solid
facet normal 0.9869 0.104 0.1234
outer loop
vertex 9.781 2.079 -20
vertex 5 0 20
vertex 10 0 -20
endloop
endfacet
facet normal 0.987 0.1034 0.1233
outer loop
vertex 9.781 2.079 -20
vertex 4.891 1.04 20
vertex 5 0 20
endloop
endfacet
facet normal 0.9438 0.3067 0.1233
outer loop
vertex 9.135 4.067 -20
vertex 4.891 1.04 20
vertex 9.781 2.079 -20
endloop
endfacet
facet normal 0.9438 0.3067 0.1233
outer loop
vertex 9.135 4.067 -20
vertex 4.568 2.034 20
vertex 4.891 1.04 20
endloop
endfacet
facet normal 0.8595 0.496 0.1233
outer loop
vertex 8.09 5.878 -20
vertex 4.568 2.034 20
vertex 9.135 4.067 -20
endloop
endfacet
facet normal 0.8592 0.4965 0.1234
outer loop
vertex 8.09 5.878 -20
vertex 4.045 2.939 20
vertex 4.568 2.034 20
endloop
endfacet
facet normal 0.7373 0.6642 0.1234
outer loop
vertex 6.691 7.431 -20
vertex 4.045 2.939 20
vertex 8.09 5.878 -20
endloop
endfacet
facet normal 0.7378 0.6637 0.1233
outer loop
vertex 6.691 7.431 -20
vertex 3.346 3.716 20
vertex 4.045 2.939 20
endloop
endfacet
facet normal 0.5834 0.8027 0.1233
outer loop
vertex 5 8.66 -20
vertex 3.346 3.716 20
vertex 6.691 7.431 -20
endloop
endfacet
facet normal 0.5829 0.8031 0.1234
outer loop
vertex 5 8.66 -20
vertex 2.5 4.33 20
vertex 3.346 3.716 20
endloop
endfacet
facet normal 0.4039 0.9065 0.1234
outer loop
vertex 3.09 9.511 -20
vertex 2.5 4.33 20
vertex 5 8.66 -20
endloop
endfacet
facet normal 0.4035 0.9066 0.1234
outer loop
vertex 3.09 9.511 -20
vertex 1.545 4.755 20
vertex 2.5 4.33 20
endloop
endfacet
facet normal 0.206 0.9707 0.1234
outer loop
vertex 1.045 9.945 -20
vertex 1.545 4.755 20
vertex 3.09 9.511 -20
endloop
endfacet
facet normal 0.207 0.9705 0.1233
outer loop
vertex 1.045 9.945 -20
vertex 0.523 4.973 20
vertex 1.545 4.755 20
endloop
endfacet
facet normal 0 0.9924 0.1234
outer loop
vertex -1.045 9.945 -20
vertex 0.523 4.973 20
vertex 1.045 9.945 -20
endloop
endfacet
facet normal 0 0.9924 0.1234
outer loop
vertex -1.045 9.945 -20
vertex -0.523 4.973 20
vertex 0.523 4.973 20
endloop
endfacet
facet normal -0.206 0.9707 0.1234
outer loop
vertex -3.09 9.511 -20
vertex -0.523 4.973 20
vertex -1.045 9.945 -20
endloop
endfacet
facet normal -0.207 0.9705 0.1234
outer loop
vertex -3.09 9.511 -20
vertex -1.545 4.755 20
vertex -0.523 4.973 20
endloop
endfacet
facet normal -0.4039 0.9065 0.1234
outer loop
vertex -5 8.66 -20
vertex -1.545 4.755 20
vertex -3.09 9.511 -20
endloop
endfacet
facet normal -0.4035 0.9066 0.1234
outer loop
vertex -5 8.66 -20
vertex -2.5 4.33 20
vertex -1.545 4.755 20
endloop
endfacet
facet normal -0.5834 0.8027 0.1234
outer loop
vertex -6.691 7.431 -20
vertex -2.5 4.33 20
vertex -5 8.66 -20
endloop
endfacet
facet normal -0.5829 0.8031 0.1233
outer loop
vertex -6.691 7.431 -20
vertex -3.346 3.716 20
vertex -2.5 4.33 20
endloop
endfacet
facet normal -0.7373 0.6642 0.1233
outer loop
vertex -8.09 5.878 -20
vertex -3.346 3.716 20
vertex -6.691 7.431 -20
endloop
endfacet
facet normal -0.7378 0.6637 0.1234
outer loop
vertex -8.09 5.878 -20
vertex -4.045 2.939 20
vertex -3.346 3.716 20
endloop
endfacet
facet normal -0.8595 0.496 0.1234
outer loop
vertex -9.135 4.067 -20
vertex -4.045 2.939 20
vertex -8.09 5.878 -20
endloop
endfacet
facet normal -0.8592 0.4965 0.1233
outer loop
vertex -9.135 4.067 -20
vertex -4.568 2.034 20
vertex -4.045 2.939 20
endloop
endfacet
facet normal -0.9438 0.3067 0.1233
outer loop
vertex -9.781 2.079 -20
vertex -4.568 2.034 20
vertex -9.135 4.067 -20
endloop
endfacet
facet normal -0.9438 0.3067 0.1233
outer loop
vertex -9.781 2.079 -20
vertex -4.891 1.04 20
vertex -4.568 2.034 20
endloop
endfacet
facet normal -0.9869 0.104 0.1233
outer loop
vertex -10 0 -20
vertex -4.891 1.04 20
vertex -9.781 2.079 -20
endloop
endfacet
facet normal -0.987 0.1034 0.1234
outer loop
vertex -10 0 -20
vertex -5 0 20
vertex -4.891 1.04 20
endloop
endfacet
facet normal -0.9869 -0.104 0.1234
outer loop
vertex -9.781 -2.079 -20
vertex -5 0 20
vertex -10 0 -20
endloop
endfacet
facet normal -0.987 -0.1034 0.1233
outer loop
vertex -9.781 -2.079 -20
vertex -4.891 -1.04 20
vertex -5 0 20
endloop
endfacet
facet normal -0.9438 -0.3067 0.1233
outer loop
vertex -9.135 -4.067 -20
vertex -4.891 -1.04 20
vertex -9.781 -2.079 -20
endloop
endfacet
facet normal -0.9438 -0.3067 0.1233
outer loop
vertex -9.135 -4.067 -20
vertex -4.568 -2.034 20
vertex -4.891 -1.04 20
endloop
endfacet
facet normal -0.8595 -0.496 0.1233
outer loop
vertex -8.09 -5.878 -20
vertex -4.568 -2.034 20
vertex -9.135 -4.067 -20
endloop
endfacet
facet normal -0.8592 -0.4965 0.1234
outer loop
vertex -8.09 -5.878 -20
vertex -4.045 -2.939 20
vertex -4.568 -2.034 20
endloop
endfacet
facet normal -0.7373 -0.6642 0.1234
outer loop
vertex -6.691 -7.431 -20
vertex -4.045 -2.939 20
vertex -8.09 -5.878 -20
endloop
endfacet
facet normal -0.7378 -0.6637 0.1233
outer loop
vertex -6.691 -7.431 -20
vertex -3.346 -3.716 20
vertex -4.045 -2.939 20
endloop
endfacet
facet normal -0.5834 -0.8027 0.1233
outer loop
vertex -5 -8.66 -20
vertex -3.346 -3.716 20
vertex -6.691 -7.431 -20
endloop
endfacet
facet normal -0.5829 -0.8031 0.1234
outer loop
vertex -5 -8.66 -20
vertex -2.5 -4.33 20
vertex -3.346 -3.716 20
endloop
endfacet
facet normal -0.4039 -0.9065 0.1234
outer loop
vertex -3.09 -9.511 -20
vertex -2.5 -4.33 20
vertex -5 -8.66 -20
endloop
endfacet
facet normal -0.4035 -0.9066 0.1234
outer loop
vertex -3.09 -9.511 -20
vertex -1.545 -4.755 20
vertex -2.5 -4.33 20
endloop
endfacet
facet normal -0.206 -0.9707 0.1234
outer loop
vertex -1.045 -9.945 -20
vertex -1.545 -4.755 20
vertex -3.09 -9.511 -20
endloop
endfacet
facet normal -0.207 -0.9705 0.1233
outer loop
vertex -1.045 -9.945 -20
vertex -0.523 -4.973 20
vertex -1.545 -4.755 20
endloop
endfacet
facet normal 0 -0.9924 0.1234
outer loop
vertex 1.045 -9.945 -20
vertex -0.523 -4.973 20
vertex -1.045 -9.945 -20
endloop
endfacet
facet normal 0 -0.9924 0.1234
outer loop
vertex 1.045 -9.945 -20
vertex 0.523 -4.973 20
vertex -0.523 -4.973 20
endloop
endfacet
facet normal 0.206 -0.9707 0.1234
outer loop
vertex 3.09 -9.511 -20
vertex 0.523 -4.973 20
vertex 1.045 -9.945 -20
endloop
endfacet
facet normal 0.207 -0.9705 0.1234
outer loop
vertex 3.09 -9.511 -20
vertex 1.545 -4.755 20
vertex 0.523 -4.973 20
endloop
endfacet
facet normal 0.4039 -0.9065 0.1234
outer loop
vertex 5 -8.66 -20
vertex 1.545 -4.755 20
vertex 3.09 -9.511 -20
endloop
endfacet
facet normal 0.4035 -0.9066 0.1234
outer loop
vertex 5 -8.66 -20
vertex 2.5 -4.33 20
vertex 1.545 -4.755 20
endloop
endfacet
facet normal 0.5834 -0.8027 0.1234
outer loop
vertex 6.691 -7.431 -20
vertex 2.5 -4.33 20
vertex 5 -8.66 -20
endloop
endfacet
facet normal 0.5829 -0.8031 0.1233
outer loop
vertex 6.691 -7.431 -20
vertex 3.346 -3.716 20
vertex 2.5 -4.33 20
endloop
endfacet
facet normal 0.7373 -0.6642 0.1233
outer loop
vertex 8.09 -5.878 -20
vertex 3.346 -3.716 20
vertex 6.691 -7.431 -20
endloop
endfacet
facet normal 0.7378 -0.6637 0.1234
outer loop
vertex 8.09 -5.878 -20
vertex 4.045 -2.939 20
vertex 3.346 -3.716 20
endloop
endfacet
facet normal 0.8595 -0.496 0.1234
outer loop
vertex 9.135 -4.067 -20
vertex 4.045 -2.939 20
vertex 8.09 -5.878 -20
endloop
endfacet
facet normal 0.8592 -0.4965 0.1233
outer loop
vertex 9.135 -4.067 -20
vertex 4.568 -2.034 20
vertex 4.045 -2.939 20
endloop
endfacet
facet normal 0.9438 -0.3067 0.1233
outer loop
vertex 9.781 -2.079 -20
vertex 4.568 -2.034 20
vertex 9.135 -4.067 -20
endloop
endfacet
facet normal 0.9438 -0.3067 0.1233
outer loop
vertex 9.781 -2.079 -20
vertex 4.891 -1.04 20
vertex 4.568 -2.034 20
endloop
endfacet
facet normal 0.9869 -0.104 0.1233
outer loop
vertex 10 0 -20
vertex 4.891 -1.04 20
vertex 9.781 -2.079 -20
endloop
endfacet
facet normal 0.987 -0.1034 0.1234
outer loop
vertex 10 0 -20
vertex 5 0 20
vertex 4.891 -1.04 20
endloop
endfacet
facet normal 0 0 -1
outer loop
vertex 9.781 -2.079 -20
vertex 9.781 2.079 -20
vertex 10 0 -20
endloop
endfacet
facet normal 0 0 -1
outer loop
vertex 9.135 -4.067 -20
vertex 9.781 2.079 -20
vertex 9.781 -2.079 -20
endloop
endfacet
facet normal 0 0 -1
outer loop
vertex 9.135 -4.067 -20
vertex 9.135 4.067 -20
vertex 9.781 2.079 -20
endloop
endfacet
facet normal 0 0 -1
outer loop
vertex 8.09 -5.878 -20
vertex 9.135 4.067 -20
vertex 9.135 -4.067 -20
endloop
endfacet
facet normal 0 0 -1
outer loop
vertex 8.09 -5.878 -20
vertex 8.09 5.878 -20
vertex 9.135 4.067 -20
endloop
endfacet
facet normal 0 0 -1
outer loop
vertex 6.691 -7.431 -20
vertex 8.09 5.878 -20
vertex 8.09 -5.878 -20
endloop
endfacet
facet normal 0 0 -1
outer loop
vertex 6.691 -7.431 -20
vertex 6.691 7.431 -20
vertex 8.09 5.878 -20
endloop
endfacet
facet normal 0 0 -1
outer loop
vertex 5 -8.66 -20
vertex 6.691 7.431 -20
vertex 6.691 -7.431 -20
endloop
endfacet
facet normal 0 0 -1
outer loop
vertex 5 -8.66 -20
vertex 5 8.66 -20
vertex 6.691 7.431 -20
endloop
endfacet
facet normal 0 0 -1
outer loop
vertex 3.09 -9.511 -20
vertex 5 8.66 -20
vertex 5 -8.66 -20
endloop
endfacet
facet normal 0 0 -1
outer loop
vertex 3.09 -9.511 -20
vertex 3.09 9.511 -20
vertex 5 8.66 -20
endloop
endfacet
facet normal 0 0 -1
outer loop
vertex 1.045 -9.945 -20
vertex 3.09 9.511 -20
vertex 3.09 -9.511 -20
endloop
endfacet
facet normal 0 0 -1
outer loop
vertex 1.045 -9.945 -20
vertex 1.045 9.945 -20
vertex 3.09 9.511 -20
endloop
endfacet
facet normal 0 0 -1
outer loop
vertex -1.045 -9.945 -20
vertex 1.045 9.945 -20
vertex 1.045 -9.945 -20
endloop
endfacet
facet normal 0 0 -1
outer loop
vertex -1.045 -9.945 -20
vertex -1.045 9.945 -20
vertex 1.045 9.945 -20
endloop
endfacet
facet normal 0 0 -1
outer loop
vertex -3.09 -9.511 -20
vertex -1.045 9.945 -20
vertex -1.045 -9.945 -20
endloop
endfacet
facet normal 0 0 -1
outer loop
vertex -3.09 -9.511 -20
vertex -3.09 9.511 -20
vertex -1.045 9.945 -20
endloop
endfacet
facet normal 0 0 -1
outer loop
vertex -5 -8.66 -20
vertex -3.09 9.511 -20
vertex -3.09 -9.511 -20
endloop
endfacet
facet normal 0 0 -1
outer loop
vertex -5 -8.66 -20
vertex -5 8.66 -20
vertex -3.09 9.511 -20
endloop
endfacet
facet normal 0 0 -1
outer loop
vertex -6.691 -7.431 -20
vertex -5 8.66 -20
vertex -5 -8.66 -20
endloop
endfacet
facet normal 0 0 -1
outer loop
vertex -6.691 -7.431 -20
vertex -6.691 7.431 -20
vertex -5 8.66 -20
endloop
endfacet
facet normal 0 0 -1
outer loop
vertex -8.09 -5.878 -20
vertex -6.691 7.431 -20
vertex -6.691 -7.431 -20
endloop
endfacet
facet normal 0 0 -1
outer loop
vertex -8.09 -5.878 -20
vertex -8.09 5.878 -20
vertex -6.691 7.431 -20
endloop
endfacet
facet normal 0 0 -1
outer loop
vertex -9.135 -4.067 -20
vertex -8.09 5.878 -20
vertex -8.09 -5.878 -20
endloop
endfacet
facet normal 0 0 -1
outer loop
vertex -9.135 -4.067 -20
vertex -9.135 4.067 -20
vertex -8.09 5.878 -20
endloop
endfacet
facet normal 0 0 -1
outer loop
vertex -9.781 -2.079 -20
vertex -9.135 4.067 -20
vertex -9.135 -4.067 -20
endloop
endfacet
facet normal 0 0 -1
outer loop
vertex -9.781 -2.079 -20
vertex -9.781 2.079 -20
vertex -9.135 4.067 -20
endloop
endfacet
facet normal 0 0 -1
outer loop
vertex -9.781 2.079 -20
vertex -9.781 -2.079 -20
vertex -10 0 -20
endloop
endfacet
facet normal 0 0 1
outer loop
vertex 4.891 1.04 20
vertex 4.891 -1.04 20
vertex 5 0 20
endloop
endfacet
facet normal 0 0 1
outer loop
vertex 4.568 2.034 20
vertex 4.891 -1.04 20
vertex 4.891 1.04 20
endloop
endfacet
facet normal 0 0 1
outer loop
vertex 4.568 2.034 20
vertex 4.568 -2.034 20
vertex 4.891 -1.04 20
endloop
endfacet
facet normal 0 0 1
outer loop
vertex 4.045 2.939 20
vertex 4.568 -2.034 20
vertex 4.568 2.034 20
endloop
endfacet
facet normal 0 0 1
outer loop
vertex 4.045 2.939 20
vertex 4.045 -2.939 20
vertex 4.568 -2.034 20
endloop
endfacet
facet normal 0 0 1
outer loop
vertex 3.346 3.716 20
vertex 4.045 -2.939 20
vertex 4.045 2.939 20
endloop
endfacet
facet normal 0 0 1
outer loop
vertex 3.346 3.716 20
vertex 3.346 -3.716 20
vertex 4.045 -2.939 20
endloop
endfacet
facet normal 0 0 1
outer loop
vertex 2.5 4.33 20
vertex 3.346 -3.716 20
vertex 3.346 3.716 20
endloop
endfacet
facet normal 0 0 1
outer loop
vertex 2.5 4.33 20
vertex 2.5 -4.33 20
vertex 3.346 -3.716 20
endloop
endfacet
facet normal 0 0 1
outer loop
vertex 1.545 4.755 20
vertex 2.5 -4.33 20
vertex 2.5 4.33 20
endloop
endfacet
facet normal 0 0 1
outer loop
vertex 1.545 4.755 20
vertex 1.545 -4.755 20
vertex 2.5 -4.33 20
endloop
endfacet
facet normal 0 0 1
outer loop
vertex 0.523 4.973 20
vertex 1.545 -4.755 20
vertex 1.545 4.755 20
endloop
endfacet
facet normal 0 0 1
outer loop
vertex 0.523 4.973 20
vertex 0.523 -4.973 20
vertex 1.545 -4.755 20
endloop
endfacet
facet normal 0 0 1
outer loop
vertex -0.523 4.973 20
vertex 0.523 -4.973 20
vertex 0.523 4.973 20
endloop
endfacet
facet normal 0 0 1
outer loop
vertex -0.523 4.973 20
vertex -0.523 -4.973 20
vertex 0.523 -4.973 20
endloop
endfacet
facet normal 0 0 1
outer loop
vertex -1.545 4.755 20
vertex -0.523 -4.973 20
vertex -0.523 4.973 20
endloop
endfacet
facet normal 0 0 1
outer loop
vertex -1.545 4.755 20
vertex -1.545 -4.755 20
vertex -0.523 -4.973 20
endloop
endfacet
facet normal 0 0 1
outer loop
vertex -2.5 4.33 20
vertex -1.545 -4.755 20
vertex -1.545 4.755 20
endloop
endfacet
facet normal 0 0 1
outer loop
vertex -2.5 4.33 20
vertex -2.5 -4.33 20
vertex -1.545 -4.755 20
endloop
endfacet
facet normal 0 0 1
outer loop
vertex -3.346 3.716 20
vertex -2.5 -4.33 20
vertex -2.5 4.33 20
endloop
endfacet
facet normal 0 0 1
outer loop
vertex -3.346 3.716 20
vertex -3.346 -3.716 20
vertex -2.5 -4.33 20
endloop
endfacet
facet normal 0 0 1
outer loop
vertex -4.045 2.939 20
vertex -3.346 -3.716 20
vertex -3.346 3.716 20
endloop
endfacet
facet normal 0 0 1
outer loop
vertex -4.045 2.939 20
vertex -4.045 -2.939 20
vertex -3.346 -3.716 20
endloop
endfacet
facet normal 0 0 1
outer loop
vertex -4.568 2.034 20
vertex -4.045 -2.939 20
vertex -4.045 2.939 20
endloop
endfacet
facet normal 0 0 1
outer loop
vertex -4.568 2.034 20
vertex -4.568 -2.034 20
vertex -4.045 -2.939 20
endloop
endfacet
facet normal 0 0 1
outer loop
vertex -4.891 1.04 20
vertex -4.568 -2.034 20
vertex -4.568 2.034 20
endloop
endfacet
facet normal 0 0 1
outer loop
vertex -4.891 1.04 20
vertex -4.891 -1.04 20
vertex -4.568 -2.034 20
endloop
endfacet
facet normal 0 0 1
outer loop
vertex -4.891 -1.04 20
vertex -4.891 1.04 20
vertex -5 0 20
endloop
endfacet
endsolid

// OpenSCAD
// Cylinder h=40mm r=10mm
cylinder(h=40, r=10);
// Cylinder h=40mm r=10mm (zentriert)
cylinder(h=40, r=10, center=true);
// Kegel h=40mm r1=10mm, r2=0 (zentriert)
cylinder(h=40, r1=10, r2=0, center=true);
// Kegel h=40mm r1=10mm, r2=10 (zentriert)
!cylinder(h=40, r1=10, r2=5, center=true);
// Cylinder h=40mm r=10mm an Position 10,0,5
translate([10,0,5]) cylinder(h=40, r=10);
// Cylinder h=40mm r=10mm rotiert um 45° x-Achse (zentriert)
rotate([45,0,0]) cylinder(h=40, r=10, center=true);
